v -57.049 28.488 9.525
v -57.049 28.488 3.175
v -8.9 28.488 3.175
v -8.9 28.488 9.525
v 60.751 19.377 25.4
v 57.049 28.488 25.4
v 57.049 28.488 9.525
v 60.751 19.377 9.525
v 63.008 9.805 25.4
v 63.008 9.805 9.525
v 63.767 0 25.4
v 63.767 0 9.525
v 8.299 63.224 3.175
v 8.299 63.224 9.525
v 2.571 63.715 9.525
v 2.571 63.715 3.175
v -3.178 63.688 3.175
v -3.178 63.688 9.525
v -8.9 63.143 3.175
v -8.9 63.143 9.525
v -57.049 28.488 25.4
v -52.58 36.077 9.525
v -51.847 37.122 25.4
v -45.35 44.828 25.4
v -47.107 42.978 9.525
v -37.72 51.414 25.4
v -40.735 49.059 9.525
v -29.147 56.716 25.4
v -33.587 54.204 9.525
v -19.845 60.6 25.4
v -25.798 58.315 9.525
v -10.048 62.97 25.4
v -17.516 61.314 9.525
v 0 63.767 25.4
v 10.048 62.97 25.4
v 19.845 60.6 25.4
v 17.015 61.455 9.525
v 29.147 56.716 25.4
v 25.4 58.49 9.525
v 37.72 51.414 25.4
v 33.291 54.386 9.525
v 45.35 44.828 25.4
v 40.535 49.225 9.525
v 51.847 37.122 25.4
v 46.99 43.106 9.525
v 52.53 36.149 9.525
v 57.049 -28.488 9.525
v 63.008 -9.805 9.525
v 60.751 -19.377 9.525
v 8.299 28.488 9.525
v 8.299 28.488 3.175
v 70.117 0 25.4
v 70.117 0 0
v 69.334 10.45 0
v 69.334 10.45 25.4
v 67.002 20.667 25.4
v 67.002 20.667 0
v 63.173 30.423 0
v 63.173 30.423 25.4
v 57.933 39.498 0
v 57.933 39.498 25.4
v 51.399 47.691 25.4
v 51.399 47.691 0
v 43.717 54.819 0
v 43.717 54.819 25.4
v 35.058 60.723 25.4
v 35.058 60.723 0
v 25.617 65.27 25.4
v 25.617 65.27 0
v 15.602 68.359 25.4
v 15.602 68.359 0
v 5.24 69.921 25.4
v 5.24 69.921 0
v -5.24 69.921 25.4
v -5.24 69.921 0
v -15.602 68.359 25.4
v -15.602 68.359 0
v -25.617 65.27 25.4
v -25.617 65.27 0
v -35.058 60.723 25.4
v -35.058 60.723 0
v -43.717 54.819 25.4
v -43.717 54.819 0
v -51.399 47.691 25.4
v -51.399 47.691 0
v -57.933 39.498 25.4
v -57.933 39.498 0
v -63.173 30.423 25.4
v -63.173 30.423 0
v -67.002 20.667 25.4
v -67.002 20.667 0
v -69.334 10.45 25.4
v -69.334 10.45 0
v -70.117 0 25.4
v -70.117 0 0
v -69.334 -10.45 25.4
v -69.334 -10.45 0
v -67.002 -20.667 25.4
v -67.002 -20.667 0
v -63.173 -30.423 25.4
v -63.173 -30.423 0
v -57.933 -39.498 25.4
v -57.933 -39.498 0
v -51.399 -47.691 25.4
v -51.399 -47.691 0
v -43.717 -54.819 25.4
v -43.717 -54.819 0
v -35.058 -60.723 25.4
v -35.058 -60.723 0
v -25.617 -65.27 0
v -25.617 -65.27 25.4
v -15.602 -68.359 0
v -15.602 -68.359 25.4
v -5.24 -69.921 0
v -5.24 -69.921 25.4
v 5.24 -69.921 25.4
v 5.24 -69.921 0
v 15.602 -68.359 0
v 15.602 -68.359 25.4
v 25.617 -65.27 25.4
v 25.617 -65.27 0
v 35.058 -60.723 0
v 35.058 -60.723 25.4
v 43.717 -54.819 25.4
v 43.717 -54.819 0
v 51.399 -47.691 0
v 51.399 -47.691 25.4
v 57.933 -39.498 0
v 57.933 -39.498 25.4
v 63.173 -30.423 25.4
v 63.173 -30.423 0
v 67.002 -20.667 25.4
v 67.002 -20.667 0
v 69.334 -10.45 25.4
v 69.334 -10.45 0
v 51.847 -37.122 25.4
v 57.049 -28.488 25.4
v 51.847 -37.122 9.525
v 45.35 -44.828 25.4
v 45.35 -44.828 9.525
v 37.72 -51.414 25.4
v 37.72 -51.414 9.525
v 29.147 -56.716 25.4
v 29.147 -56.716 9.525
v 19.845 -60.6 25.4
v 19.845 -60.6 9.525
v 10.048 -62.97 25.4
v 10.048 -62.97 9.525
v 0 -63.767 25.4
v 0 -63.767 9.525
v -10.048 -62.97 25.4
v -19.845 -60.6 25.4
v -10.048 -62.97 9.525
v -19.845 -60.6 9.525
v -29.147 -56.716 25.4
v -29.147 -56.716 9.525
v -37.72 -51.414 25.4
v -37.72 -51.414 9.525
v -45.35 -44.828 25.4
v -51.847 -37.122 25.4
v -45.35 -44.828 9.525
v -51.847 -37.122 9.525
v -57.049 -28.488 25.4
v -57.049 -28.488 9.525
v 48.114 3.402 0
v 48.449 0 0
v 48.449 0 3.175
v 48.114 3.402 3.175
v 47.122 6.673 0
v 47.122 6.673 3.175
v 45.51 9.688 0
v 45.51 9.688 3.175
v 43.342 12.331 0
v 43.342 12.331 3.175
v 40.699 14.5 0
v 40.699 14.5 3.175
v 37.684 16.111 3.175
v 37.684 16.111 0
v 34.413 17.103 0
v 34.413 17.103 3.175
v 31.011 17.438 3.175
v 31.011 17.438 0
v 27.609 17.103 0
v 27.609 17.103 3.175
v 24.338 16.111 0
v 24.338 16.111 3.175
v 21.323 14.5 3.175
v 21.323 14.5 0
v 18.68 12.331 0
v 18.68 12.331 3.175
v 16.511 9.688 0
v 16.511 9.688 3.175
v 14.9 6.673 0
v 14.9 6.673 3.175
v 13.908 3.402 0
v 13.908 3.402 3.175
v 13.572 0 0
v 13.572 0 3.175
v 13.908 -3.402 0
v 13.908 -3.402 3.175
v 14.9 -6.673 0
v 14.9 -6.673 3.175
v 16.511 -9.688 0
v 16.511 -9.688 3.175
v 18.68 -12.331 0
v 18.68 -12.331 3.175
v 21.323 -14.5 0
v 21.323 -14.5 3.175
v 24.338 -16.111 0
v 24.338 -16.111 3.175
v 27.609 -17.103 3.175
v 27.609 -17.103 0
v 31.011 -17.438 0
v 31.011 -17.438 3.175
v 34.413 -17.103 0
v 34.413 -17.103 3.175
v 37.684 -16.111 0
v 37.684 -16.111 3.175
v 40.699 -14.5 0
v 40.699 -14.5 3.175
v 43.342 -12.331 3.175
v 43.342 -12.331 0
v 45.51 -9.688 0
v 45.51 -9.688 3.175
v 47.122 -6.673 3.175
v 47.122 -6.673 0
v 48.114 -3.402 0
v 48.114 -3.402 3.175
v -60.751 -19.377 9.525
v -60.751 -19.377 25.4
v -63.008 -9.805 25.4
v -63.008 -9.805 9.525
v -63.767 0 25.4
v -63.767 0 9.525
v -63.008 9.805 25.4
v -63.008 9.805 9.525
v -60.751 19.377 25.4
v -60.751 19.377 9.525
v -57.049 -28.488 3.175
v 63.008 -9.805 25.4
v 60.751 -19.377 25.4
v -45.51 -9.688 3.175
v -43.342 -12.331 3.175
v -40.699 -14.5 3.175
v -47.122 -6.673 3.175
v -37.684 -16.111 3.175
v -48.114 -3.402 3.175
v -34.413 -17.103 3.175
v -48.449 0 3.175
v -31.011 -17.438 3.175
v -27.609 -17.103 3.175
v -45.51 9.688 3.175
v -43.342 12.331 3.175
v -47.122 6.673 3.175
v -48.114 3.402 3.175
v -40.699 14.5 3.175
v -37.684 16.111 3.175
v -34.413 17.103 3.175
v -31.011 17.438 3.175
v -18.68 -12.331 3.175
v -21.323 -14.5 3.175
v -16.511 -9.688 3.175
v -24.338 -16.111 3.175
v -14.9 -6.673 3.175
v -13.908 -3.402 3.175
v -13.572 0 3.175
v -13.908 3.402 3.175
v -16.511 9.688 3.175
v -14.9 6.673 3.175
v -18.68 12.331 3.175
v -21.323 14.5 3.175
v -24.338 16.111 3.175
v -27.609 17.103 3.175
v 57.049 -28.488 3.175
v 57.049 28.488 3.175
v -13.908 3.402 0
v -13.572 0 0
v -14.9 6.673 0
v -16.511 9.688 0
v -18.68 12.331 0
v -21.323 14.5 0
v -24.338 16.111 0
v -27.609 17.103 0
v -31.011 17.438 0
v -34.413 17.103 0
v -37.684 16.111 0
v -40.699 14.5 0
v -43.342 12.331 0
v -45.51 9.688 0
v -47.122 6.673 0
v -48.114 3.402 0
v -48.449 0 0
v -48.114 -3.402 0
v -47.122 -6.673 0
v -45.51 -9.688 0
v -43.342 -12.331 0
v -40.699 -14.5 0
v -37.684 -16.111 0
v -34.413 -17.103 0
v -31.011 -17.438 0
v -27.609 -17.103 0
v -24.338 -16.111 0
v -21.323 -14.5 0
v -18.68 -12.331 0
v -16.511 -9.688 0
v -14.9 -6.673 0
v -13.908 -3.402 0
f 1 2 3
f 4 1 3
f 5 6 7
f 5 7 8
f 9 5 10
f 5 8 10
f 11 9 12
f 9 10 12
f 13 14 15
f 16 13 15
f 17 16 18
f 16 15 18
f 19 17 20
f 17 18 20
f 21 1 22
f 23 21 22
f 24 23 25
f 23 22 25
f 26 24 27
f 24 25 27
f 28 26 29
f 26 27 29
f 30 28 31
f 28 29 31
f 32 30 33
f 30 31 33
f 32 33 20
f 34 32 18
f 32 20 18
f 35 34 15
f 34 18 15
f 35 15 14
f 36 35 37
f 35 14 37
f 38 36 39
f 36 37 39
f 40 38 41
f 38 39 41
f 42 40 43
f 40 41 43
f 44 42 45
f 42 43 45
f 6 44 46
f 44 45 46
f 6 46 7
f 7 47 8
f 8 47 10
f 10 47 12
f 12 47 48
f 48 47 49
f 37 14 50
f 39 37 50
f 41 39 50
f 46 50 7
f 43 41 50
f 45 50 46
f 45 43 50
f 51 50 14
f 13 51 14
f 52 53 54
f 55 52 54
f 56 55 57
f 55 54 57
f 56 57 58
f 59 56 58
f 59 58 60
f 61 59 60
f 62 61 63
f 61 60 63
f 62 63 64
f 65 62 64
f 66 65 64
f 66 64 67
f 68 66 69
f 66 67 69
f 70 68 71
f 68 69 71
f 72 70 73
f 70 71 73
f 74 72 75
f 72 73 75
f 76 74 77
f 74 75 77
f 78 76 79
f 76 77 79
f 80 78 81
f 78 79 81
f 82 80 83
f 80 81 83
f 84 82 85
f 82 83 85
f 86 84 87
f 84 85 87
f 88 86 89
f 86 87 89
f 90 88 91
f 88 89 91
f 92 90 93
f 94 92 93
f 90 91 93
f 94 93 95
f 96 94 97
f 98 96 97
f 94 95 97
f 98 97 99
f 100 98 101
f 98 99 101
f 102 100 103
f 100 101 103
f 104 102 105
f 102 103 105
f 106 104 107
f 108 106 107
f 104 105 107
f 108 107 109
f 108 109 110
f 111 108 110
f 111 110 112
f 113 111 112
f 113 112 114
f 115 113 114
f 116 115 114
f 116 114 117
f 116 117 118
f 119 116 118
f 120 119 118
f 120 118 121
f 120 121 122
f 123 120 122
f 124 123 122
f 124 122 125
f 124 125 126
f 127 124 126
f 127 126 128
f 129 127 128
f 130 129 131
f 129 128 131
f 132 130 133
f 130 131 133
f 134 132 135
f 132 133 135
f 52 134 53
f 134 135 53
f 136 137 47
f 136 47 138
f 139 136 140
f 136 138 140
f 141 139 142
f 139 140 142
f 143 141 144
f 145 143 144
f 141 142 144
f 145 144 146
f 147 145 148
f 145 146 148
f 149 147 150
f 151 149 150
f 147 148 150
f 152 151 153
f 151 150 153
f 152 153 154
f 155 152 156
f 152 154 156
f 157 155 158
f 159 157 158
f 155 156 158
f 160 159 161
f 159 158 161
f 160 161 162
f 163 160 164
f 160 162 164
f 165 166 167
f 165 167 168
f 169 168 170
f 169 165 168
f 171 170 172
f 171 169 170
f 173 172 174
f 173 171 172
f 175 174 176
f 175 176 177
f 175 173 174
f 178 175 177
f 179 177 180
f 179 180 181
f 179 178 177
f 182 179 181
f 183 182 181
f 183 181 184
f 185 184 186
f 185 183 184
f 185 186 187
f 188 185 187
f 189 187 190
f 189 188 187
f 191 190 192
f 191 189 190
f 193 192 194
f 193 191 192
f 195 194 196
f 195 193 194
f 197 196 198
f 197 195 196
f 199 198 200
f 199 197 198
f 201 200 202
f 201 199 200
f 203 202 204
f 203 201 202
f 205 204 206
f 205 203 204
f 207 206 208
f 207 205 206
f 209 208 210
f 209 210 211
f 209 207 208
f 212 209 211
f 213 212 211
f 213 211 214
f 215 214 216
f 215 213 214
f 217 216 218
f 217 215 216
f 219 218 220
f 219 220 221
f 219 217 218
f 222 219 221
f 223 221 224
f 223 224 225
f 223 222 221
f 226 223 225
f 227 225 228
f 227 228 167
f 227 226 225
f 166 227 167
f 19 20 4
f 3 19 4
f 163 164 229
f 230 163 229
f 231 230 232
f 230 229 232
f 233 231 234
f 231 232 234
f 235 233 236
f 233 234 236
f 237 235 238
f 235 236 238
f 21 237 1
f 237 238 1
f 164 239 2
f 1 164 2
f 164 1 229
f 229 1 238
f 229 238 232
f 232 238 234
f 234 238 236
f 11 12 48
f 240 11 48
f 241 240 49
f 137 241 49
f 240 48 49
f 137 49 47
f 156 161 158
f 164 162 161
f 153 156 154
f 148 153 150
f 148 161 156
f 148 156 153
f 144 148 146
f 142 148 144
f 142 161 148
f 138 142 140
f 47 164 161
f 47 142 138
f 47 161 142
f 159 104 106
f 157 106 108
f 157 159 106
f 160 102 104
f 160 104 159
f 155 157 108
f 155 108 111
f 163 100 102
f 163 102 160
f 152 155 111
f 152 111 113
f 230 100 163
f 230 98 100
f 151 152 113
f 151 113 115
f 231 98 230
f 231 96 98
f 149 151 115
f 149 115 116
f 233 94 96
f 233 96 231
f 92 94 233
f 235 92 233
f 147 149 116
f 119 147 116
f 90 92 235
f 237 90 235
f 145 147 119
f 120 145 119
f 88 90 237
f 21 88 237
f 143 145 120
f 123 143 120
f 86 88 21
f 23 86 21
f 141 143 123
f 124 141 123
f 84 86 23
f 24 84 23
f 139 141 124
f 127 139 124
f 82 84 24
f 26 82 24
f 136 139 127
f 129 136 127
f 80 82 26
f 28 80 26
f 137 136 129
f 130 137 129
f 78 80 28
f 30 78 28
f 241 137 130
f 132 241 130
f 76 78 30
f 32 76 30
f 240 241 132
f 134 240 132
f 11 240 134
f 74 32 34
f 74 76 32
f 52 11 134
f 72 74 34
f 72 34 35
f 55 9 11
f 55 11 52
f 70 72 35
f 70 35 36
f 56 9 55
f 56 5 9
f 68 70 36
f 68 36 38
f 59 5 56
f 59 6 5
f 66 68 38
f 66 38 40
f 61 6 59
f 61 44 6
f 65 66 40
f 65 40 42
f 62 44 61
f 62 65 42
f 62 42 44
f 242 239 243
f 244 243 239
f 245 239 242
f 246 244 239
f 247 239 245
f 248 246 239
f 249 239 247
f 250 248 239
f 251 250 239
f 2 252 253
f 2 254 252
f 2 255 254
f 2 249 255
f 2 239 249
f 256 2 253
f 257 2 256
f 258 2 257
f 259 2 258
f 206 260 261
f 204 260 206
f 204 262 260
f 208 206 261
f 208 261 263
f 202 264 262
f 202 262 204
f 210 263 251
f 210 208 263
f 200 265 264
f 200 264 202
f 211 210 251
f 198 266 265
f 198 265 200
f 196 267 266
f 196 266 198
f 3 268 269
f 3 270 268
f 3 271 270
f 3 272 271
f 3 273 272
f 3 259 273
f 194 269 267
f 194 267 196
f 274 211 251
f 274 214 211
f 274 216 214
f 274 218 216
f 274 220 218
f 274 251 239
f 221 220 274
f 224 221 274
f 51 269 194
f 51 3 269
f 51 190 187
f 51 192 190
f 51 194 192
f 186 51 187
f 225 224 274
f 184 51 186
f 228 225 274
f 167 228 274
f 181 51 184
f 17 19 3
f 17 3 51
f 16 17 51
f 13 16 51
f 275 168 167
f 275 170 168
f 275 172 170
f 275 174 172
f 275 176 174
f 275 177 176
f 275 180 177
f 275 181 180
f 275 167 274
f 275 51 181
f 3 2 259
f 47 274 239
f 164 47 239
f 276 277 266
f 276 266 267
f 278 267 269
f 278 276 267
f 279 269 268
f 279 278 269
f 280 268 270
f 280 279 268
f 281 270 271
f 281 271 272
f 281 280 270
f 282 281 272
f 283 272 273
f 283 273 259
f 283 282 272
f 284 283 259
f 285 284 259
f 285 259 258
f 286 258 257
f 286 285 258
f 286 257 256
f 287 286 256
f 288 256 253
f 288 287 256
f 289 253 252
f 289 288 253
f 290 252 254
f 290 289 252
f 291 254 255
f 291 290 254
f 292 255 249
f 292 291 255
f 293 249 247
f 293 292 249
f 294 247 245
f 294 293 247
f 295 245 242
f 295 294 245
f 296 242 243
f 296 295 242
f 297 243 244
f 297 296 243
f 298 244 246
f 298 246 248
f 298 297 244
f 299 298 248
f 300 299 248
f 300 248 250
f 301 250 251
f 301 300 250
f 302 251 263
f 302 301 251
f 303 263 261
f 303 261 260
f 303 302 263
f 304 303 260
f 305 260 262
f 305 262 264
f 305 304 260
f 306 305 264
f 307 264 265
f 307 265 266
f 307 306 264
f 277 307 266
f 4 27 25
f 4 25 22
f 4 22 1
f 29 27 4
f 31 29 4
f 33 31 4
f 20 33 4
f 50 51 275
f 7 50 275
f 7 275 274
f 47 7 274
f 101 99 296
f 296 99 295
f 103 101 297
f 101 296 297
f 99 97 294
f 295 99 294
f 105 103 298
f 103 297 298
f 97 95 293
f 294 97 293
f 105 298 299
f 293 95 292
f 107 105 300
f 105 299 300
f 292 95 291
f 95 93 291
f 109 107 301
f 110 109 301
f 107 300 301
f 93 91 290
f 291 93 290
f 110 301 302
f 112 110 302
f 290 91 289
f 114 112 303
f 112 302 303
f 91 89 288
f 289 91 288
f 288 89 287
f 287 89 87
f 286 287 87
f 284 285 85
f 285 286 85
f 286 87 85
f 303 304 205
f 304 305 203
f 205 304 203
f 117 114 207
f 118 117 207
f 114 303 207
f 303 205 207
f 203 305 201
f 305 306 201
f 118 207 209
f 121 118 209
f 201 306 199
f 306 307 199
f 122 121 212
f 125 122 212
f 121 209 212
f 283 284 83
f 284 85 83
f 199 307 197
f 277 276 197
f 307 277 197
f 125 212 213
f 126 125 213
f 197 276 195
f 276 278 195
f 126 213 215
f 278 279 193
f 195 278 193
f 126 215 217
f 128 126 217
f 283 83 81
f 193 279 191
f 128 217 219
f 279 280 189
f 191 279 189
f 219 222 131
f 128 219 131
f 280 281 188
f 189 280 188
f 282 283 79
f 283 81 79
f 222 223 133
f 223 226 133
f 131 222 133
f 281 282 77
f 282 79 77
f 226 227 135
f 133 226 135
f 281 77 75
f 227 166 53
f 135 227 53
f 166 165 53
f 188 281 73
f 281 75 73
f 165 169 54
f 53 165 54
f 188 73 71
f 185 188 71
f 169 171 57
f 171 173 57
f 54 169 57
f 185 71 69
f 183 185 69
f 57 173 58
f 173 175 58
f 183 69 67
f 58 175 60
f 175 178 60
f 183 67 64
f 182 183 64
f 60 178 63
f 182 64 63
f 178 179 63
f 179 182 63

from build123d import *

# Parameters (mm, degrees)
F0_R     = 70.1167257922
F1_DEPTH = 25.4
F2_DEPTH = 9.525
F0_W     = 114.0985068913
F0_H     = 56.9764161581
F0_R_2   = 17.4384026712
F3_DEPTH = 3.175
F5_DEPTH = 6.35


with BuildPart() as f1:
    # F0 (on Top) → F1 (new body)
    with BuildSketch(Plane.XY):
        Circle(F0_R)
        with BuildLine():
            ThreePointArc((57.0492534457, 28.4882080791), (62.0646413805, 14.6347397849), (63.7667257922, 0))
            ThreePointArc((63.7667257922, 0), (62.0646413805, -14.6347397849), (57.0492534457, -28.4882080791))
            ThreePointArc((57.0492534457, -28.4882080791), (0, -63.7667257922), (-57.0492534457, -28.4882080791))
            ThreePointArc((-57.0492534457, -28.4882080791), (-63.7667257922, 0), (-57.0492534457, 28.4882080791))
            ThreePointArc((-57.0492534457, 28.4882080791), (0, 63.7667257922), (57.0492534457, 28.4882080791))
        make_face(mode=Mode.SUBTRACT)
    extrude(amount=F1_DEPTH)

    # F0 (on Top) → F2 (join)
    with BuildSketch(Plane.XY):
        with BuildLine():
            Line((-57.0492534457, 28.4882080791), (57.0492534457, 28.4882080791))
            ThreePointArc((57.0492534457, 28.4882080791), (0, 63.7667257922), (-57.0492534457, 28.4882080791))
        make_face()
        with BuildLine():
            Line((-57.0492534457, -28.4882080791), (-57.0492534457, 28.4882080791))
            ThreePointArc((-57.0492534457, 28.4882080791), (-63.7667257922, 0), (-57.0492534457, -28.4882080791))
        make_face()
        with BuildLine():
            ThreePointArc((-57.0492534457, -28.4882080791), (0, -63.7667257922), (57.0492534457, -28.4882080791))
            Line((57.0492534457, -28.4882080791), (-57.0492534457, -28.4882080791))
        make_face()
        with BuildLine():
            ThreePointArc((57.0492534457, -28.4882080791), (62.0646413805, -14.6347397849), (63.7667257922, 0))
            ThreePointArc((63.7667257922, 0), (62.0646413805, 14.6347397849), (57.0492534457, 28.4882080791))
            Line((57.0492534457, 28.4882080791), (57.0492534457, -28.4882080791))
        make_face()
    extrude(amount=F2_DEPTH)

    # F0 (on Top) → F3 (join)
    with BuildSketch(Plane.XY):
        Rectangle(F0_W, F0_H)
        with Locations((-31.0109015554, 0)):
            Circle(F0_R_2, mode=Mode.SUBTRACT)
        with Locations((31.0109015554, 0)):
            Circle(F0_R_2, mode=Mode.SUBTRACT)
    extrude(amount=F3_DEPTH)

    # F4 (on face) → F5 (cut)
    with BuildSketch(Plane.XY.offset(9.525)):
        with BuildLine():
            Line((-8.9004095644, 63.1425215512), (-8.9004095644, 28.4882080791))
            Line((-8.9004095644, 28.4882080791), (8.2985507539, 28.4882080791))
            Line((8.2985507539, 28.4882080791), (8.2985507539, 63.224436523))
            ThreePointArc((8.2985507539, 63.224436523), (-0.3037038403, 63.7660025581), (-8.9004095644, 63.1425215512))
        make_face()
    extrude(amount=-F5_DEPTH, mode=Mode.SUBTRACT)


solid = f1.part
